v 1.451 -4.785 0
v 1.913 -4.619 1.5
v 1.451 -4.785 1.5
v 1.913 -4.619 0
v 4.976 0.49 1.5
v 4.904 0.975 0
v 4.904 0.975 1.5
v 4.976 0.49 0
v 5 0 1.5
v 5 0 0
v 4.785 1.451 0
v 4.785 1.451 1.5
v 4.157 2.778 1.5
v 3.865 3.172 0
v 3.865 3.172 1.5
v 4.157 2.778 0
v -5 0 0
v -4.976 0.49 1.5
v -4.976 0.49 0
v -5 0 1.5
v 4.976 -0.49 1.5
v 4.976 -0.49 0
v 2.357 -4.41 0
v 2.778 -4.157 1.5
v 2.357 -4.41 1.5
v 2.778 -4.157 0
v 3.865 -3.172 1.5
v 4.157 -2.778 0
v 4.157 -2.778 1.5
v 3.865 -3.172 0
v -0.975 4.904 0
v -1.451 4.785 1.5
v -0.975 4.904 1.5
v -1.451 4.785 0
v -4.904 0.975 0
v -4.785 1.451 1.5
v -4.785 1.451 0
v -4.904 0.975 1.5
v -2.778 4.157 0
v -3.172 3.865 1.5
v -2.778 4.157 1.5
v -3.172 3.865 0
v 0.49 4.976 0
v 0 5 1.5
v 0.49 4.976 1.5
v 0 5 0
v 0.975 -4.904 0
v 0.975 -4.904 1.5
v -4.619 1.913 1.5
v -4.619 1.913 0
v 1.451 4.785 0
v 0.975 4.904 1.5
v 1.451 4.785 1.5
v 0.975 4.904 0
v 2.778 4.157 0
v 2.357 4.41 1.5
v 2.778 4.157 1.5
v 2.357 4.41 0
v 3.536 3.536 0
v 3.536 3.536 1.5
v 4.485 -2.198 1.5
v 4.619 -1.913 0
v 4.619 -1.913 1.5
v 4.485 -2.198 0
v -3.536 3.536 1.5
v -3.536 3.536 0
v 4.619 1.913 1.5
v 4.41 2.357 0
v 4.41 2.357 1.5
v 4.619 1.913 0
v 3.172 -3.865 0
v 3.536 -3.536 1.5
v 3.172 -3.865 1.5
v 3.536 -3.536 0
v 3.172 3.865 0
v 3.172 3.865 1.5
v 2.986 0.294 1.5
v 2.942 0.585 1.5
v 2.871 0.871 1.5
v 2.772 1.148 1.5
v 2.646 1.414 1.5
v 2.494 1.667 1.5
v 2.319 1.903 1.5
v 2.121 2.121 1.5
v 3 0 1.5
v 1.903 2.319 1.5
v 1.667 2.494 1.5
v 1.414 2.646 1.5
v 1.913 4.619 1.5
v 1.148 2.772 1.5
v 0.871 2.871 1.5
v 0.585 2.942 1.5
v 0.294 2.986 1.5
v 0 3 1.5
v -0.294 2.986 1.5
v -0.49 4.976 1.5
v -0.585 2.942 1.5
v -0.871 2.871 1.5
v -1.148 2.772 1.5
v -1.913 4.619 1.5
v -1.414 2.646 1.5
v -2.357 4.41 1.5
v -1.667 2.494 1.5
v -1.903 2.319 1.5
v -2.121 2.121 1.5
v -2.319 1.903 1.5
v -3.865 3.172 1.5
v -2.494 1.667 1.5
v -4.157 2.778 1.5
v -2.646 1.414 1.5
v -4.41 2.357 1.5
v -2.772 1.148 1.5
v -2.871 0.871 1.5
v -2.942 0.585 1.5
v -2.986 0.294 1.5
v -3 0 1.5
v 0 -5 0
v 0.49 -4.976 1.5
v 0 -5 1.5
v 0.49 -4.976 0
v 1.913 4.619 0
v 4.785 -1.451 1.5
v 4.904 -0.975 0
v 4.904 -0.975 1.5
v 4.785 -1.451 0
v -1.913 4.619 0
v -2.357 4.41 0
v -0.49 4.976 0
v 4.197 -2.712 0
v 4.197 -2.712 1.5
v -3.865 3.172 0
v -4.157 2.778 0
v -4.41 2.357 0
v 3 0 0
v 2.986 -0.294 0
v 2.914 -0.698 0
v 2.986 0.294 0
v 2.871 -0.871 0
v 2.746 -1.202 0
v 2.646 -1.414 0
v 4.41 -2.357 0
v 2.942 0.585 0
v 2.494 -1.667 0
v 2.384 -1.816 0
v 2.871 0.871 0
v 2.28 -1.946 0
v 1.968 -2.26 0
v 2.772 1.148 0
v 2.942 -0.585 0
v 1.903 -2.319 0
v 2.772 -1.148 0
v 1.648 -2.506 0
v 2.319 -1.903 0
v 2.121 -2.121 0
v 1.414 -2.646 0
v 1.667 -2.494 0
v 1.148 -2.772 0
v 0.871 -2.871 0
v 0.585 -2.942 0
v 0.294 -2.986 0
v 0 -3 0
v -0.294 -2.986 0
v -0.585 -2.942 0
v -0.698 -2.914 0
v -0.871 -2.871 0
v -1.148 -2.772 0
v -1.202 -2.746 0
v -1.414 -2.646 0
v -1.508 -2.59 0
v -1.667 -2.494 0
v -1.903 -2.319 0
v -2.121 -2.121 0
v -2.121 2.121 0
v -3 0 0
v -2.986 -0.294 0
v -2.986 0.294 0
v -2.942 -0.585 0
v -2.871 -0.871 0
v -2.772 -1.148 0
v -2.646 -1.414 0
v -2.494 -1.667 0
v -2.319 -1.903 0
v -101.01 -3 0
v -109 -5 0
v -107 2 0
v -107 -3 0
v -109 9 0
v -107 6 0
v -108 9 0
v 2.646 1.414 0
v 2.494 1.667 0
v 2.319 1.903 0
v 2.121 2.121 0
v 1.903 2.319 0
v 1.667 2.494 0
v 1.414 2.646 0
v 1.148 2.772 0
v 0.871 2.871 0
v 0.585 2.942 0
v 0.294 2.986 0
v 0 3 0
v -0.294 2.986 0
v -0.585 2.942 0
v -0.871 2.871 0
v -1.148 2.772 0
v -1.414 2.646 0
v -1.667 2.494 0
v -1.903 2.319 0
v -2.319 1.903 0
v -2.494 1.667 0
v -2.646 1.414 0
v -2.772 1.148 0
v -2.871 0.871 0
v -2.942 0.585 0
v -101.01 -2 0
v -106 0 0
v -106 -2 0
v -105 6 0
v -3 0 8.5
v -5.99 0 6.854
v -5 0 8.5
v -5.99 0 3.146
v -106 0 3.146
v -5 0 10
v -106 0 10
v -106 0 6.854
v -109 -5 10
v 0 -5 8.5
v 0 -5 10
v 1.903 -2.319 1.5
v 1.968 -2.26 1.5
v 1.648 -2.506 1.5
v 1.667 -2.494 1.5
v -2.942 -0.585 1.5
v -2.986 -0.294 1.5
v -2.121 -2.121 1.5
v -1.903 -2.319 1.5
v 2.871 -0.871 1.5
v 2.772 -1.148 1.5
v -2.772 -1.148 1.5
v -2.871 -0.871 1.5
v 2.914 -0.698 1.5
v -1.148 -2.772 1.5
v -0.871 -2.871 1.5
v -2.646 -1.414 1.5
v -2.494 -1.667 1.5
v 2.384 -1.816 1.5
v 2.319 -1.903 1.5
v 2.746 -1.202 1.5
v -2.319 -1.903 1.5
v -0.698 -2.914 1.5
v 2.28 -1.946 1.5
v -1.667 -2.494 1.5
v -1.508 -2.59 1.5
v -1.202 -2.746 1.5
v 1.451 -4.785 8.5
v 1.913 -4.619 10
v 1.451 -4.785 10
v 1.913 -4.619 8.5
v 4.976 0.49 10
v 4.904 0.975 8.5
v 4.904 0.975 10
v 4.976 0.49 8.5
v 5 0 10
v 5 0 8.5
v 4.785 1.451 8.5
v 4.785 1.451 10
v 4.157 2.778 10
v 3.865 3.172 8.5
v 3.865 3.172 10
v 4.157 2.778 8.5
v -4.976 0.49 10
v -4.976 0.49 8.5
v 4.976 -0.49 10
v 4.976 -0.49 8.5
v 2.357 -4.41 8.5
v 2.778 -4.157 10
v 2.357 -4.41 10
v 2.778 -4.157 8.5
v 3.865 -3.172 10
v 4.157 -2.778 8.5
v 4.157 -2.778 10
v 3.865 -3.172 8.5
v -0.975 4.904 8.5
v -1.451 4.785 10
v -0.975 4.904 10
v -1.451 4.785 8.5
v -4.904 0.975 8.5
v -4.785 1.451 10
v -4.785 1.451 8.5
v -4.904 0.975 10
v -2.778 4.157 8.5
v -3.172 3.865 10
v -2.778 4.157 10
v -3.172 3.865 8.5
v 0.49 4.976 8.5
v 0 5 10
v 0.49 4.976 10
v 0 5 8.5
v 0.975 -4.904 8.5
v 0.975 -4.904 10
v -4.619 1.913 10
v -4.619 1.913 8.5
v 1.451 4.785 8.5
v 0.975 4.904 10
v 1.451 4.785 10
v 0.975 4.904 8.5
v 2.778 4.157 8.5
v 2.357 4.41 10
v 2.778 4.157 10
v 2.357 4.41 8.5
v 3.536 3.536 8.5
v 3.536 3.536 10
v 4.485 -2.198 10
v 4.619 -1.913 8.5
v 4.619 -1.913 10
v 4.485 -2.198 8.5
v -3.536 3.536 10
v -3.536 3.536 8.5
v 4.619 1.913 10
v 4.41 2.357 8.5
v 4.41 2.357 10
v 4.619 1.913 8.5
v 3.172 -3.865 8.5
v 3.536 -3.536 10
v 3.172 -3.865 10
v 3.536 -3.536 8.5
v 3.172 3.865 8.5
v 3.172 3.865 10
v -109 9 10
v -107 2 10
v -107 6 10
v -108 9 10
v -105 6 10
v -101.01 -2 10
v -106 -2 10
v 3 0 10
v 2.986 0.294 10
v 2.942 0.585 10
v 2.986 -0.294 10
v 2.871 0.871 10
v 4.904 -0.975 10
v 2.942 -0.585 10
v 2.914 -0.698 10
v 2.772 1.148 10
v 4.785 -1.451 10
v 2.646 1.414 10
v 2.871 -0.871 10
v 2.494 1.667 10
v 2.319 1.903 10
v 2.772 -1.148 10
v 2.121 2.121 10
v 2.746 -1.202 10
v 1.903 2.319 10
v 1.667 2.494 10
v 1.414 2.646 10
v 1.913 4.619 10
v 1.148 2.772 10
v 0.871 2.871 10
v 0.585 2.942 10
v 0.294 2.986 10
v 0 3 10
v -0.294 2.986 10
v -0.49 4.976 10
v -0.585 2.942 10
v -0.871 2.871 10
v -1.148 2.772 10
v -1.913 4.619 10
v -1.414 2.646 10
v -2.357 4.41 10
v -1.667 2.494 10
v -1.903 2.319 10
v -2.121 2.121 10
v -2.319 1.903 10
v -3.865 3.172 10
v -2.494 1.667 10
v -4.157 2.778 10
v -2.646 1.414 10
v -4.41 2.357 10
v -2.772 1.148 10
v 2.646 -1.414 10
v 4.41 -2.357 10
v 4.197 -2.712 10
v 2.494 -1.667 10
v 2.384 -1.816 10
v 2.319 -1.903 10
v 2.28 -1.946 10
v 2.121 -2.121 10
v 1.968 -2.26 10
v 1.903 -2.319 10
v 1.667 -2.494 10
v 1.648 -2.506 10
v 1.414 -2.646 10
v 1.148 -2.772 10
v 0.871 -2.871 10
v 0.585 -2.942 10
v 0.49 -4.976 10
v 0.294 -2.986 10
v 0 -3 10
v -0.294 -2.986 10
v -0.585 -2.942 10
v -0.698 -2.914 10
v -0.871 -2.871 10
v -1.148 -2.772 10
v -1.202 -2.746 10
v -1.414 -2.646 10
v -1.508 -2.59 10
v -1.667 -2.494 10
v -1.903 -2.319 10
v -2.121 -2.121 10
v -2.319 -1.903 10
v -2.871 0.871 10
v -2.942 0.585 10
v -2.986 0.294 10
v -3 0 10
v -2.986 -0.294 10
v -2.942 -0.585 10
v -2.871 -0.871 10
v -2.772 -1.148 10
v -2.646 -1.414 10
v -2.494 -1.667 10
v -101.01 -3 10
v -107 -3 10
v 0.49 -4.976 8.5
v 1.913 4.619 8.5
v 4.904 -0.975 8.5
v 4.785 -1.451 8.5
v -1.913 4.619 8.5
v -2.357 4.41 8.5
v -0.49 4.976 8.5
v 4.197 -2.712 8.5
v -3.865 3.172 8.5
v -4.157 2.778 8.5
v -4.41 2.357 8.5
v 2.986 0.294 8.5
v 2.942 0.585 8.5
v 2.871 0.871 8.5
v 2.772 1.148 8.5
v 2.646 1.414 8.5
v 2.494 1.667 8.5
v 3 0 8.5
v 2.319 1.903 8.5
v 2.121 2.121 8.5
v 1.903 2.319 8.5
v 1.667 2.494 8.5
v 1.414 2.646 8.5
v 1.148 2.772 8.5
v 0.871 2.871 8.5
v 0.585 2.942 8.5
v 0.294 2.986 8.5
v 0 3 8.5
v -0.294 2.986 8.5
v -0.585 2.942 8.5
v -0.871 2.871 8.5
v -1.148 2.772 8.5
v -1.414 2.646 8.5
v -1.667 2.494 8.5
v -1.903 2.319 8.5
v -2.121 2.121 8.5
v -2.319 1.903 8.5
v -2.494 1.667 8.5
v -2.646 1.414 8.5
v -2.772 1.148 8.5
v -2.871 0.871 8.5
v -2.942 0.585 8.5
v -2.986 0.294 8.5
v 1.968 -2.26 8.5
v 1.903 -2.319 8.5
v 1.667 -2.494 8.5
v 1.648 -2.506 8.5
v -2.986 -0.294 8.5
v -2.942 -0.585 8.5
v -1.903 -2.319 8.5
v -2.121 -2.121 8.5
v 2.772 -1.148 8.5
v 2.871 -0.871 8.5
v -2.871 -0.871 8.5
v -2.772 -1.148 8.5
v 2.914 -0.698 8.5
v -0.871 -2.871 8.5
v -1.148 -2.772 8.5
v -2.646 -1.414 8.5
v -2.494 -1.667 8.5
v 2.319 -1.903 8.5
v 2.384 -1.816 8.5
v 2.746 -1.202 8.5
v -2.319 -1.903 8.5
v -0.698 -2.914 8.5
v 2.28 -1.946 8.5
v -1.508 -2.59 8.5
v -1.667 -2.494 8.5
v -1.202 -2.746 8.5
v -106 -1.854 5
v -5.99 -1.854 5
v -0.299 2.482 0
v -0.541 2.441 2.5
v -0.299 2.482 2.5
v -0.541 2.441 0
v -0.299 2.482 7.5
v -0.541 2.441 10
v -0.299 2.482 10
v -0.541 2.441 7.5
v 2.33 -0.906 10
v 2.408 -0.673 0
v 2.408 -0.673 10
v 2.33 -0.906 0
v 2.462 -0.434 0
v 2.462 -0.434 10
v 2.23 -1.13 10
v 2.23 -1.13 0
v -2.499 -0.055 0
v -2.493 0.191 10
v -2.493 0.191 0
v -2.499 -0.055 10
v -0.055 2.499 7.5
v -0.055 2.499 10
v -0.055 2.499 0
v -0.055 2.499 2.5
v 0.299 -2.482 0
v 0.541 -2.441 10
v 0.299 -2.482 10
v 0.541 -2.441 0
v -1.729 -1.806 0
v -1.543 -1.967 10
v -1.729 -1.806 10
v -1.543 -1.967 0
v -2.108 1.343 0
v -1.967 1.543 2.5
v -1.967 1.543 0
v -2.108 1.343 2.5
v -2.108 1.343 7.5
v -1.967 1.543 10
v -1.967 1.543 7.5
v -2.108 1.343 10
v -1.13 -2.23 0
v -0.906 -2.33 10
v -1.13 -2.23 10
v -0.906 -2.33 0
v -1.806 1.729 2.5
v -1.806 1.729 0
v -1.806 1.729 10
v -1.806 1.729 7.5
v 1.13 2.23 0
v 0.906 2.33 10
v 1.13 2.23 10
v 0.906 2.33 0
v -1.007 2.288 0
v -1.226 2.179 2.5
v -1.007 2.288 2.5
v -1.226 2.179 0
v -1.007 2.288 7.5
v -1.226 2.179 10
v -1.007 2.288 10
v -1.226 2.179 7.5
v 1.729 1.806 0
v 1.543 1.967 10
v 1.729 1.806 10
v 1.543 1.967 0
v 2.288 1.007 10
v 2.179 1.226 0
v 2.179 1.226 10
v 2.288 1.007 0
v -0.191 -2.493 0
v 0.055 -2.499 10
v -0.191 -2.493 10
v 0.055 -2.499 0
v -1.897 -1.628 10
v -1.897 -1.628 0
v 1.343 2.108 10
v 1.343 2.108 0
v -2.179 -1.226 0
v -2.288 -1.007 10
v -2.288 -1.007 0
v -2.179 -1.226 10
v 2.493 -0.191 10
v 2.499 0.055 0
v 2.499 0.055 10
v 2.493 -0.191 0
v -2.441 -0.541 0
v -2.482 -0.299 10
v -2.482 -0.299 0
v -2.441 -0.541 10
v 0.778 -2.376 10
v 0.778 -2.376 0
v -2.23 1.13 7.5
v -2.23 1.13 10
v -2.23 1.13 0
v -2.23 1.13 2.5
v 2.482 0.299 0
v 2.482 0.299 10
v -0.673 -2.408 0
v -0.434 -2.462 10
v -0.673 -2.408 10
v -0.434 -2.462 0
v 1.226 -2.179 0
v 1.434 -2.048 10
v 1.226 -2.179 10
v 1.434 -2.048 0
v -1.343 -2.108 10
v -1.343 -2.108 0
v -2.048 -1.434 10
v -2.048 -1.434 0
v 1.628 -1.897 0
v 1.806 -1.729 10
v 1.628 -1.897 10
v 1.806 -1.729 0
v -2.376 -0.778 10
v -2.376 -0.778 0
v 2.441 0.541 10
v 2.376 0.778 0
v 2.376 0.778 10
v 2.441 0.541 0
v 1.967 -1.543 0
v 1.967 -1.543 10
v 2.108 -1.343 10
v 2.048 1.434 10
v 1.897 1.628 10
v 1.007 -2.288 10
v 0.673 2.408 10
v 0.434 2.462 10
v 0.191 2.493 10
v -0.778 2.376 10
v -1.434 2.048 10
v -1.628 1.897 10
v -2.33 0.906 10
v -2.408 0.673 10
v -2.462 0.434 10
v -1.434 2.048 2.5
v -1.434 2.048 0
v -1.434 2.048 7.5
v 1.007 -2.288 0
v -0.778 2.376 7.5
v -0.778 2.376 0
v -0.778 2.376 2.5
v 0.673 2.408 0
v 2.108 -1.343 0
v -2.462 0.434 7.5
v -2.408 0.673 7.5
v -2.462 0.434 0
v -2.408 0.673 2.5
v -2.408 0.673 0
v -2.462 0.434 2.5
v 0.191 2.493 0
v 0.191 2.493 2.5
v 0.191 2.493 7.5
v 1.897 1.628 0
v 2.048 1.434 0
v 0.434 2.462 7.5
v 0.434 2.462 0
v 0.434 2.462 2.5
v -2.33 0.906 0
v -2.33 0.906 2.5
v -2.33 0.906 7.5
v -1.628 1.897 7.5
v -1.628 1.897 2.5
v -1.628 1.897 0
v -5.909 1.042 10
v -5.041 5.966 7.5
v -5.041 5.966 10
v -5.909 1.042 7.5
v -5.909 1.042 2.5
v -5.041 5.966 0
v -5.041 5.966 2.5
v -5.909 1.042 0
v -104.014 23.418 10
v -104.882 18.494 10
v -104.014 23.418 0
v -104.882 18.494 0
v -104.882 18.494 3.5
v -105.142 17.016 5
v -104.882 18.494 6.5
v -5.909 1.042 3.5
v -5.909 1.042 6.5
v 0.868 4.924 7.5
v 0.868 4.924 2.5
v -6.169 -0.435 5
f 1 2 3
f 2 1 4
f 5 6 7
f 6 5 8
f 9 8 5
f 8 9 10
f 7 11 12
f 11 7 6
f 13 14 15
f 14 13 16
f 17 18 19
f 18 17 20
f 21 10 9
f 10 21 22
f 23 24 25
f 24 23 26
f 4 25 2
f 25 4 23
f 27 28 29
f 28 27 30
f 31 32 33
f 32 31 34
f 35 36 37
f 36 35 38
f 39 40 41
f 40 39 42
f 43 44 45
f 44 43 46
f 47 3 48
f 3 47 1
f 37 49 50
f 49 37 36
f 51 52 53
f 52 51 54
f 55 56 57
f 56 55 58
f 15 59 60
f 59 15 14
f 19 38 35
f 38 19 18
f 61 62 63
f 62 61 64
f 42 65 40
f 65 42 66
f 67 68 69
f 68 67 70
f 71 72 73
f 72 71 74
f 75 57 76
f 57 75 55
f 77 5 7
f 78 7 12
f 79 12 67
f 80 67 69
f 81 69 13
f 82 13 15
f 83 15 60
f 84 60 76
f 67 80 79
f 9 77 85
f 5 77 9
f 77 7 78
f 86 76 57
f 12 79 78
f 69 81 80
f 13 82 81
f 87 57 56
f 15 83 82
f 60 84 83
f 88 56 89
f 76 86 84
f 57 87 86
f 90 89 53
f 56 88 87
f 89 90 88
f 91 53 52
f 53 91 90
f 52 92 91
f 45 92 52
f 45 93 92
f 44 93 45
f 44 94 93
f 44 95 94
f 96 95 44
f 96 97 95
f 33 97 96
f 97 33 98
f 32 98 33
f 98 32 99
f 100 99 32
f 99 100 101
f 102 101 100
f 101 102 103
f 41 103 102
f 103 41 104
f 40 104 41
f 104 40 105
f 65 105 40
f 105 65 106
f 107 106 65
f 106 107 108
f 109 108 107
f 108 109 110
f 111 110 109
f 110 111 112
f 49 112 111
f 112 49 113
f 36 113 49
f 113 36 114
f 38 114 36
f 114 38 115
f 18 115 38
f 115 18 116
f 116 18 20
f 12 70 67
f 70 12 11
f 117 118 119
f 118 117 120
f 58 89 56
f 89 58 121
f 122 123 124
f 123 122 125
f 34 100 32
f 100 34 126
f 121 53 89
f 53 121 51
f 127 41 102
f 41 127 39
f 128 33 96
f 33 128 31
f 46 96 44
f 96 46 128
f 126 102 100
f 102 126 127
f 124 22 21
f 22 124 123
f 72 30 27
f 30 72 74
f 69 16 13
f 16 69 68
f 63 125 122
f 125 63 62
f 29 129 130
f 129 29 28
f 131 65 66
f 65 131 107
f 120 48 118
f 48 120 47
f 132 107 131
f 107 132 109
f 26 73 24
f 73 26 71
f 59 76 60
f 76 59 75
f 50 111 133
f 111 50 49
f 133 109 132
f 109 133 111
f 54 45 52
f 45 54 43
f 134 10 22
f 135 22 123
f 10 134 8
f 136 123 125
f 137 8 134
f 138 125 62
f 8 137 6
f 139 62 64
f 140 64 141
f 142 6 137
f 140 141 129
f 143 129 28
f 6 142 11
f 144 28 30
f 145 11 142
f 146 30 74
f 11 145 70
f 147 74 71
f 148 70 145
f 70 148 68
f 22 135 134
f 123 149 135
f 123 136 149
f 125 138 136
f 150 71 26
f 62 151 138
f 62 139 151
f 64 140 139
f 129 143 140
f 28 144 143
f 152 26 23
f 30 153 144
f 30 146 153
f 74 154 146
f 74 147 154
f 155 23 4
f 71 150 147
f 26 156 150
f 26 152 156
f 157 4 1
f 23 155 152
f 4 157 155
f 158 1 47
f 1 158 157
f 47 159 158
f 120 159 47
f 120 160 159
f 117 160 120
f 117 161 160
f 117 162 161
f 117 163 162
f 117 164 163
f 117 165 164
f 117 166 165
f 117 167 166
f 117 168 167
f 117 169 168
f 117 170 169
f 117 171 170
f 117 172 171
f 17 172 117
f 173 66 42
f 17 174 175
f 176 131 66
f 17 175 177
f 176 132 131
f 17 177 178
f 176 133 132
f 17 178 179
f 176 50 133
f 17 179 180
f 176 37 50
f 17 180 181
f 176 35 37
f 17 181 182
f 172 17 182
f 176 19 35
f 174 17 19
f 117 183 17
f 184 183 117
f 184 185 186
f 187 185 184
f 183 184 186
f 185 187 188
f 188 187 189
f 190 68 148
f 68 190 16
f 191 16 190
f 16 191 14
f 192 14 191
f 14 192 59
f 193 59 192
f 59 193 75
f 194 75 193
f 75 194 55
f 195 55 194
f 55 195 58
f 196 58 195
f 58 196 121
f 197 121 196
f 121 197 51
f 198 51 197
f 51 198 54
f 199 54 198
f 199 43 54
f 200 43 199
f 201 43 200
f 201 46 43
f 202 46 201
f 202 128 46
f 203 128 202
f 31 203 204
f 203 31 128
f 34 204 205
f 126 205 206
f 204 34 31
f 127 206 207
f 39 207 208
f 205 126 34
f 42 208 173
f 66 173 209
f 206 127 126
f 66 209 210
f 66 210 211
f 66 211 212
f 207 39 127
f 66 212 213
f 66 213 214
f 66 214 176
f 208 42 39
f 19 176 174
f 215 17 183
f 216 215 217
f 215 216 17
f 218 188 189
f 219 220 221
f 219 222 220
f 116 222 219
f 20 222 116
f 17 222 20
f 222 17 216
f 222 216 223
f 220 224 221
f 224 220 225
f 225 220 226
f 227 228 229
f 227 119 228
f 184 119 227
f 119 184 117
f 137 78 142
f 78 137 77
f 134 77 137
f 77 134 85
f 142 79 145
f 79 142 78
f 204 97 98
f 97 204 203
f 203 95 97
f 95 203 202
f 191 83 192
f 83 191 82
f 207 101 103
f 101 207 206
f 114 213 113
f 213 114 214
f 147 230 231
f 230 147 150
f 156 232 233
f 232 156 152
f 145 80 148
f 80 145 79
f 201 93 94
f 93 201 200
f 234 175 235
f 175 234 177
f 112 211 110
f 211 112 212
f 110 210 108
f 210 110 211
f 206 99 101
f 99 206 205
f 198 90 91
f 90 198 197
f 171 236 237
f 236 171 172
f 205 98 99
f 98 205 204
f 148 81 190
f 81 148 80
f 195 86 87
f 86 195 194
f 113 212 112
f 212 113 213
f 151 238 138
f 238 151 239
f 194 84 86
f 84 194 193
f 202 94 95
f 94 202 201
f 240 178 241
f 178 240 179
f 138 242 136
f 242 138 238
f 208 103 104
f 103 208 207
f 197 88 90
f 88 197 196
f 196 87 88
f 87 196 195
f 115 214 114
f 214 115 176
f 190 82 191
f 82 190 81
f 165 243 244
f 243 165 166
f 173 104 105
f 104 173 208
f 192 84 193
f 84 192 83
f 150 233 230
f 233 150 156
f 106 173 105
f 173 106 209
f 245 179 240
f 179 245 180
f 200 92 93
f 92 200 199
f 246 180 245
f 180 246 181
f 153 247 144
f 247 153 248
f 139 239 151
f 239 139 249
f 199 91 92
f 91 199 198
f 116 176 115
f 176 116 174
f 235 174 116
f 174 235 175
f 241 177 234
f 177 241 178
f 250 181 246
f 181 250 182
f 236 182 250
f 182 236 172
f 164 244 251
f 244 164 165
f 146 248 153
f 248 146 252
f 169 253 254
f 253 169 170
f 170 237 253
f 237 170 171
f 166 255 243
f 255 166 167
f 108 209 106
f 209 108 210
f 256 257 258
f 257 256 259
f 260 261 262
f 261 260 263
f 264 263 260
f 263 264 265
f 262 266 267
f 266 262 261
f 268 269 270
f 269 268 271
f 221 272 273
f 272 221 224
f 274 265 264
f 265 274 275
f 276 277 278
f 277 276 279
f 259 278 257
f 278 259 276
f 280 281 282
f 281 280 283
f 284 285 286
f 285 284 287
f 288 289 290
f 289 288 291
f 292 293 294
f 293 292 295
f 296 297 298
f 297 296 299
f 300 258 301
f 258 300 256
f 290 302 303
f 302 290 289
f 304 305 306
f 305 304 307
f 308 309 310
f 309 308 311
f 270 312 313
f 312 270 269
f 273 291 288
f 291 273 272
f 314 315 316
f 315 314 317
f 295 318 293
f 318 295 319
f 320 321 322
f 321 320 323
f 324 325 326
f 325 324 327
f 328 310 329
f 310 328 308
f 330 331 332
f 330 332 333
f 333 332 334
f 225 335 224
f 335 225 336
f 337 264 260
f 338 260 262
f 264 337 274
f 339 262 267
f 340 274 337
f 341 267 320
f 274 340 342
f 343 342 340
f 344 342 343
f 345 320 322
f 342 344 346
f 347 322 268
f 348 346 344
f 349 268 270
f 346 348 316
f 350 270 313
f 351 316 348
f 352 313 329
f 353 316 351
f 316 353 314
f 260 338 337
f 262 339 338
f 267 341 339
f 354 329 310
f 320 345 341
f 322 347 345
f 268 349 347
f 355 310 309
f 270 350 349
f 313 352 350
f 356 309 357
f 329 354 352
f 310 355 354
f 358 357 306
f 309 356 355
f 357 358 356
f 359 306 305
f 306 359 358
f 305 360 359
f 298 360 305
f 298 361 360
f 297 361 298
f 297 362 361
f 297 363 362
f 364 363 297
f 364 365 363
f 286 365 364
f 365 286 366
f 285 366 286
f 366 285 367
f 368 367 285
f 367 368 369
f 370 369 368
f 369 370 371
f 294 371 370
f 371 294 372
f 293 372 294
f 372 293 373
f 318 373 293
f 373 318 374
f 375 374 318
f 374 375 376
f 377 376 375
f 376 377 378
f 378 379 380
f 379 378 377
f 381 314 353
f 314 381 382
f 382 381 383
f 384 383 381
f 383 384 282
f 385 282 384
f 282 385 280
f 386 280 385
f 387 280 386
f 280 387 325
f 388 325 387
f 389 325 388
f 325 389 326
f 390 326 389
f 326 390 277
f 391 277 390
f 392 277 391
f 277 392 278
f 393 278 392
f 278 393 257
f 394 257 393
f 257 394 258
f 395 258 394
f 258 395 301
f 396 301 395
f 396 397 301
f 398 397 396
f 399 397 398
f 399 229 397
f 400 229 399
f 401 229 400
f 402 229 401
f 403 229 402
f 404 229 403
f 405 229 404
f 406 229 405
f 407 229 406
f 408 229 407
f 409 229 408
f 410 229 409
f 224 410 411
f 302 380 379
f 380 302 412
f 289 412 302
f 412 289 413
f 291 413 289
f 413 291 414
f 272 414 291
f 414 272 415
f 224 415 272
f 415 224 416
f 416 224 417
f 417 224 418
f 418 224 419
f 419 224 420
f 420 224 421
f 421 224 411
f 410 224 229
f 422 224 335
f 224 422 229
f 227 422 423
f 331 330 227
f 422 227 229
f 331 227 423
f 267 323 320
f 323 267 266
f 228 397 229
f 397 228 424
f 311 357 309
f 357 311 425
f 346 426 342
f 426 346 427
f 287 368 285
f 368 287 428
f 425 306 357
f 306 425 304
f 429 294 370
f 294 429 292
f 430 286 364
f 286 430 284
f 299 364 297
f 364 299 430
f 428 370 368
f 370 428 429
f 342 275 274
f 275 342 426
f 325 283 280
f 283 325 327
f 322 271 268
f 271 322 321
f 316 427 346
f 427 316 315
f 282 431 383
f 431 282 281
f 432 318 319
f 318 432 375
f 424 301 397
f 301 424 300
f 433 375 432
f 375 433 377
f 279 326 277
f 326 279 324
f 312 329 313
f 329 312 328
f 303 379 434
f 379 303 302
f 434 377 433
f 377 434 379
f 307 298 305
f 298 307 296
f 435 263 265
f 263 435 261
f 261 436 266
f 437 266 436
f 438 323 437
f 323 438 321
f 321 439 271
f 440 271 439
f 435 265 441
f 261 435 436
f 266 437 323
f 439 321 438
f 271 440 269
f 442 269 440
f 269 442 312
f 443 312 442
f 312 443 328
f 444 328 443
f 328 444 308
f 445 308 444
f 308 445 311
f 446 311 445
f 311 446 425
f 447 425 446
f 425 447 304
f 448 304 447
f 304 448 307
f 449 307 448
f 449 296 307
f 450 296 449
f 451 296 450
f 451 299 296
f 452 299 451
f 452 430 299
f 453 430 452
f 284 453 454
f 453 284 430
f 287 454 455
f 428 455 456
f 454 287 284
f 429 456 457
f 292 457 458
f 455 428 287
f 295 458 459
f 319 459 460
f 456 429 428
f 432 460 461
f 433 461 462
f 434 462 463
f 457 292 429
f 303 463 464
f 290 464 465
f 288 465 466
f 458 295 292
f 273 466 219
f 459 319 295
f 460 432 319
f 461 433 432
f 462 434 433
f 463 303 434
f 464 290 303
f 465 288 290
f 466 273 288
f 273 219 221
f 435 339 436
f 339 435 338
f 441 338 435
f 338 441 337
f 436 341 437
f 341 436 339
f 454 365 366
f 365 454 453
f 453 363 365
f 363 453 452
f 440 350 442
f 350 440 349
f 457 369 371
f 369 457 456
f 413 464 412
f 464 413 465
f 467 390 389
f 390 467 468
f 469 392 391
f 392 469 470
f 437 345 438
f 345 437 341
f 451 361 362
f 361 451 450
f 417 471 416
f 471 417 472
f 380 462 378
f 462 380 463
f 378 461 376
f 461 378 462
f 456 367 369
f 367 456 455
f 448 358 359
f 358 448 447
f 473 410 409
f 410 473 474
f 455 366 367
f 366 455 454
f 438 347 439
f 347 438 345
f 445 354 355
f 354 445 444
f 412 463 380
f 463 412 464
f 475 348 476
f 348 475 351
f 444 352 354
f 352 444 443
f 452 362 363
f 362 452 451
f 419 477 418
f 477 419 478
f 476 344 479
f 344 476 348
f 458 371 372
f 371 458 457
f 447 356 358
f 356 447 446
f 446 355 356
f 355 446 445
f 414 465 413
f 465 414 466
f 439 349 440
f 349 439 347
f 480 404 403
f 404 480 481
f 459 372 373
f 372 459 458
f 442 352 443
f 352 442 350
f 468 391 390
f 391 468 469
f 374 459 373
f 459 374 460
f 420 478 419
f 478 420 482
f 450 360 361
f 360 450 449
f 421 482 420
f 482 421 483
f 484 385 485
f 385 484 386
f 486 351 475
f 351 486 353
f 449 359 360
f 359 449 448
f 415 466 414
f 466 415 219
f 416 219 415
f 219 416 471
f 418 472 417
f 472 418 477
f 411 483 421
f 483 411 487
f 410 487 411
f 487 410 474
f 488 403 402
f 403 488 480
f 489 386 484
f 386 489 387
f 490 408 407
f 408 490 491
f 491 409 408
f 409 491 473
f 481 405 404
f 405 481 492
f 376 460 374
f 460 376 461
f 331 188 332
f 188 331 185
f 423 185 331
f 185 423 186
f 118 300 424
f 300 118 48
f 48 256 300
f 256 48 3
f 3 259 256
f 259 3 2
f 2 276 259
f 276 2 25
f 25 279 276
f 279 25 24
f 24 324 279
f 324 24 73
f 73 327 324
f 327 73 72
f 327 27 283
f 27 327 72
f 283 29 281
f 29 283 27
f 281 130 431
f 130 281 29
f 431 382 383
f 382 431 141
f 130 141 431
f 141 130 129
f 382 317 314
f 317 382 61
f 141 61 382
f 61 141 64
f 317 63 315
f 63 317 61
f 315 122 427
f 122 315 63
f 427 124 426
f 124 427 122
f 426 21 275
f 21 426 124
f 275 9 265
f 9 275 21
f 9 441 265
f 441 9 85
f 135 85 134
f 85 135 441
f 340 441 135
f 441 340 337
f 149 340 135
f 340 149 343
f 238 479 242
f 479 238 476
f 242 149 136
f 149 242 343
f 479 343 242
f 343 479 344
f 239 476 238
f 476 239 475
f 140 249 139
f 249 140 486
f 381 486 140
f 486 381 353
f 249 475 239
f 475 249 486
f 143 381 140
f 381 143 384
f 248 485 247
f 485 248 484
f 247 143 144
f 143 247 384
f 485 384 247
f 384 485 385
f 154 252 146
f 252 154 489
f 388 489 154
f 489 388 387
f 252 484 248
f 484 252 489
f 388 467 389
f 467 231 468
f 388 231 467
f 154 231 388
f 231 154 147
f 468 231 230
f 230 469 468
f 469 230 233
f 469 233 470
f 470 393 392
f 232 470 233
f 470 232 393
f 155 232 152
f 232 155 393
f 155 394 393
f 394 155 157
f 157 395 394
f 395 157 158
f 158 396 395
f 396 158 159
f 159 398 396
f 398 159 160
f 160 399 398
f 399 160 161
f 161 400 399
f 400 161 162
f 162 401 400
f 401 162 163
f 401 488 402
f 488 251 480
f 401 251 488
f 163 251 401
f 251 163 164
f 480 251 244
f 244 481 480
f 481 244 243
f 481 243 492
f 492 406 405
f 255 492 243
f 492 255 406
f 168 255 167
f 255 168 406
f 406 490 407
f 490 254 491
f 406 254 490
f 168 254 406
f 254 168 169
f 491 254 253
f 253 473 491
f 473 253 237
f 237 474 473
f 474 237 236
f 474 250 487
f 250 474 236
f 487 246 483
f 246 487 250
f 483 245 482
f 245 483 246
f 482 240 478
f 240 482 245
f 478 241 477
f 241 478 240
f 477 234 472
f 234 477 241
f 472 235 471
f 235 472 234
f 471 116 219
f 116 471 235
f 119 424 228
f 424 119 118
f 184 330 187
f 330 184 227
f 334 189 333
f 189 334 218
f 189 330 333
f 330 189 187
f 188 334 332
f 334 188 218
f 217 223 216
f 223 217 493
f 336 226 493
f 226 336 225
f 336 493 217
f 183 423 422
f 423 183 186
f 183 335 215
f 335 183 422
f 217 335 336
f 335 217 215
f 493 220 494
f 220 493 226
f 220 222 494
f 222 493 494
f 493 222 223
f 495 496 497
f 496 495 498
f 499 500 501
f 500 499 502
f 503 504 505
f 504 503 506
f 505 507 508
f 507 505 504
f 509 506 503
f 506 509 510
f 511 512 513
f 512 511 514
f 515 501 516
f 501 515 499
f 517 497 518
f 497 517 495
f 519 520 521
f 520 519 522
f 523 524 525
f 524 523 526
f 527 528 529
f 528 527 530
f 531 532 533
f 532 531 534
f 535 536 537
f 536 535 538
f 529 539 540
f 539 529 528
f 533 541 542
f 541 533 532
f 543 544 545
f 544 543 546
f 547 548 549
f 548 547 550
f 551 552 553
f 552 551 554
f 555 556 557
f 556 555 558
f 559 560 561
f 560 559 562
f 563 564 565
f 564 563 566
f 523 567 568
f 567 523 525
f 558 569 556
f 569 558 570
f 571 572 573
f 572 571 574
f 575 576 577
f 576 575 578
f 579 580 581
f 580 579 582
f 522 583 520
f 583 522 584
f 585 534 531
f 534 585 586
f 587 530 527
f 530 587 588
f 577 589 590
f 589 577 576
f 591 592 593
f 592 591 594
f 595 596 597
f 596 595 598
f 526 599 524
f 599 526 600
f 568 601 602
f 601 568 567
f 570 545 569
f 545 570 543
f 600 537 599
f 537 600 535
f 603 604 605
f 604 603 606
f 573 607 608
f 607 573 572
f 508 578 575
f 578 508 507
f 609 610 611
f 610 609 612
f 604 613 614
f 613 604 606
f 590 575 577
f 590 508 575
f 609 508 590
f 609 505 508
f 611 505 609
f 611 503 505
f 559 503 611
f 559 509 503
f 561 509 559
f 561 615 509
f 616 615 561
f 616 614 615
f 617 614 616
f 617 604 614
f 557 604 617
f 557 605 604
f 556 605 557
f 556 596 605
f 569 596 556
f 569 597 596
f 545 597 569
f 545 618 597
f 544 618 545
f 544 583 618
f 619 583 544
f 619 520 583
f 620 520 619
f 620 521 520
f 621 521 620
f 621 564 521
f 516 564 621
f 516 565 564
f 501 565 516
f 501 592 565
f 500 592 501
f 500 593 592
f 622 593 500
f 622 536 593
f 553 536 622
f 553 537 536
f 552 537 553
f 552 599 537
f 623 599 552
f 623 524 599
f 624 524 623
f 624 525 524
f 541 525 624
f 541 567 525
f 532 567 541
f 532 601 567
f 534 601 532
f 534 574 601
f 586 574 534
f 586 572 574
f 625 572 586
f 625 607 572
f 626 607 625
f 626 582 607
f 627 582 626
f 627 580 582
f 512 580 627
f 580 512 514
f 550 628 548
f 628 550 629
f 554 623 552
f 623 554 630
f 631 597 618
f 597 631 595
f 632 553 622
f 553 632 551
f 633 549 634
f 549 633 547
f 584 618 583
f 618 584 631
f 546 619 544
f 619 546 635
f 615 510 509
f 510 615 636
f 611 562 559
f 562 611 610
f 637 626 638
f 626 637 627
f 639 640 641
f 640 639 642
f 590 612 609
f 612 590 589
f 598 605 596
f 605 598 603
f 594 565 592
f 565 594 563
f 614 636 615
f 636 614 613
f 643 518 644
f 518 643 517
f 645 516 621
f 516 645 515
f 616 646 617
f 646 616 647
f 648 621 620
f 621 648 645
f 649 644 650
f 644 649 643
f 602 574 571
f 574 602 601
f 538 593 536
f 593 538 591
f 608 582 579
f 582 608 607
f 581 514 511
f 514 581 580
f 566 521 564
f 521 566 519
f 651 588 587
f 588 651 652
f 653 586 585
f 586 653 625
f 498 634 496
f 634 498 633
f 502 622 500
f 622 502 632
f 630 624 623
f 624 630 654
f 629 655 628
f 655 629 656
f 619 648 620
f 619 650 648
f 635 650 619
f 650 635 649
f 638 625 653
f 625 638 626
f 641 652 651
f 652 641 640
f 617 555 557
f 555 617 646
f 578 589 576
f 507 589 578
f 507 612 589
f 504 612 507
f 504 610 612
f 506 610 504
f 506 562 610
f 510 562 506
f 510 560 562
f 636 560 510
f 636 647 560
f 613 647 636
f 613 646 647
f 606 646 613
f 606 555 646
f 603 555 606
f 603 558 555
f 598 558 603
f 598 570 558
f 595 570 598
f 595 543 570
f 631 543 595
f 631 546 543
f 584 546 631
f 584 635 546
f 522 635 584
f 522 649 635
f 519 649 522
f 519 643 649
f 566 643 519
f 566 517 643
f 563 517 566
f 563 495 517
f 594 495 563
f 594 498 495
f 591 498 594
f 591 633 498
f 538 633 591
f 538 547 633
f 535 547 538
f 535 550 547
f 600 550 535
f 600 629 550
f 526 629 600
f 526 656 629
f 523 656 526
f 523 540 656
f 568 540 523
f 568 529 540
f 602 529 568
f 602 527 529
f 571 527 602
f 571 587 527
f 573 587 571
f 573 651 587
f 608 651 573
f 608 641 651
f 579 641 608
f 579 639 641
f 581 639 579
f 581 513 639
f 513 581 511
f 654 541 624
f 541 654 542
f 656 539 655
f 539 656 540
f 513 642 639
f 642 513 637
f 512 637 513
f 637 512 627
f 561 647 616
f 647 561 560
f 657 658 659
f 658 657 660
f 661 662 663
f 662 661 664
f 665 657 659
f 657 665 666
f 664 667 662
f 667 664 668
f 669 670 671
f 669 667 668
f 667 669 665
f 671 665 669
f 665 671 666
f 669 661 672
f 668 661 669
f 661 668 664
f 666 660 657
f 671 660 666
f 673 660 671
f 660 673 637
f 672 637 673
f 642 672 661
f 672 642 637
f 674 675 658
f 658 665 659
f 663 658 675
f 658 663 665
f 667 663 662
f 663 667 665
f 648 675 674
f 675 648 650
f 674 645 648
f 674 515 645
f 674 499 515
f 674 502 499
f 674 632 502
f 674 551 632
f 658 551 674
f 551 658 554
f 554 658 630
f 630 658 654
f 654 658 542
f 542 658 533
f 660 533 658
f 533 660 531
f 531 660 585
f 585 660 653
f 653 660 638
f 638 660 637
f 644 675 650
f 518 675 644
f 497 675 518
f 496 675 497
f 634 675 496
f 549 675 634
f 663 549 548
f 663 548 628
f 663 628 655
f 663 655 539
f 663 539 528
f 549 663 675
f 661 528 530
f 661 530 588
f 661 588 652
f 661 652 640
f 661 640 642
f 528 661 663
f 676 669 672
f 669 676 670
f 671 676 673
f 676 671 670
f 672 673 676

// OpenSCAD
// Parametric Bag Clip - PLA compatible
// https://www.thingiverse.com/thing:3388572
// by Bikecyclist
// https://www.thingiverse.com/Bikecyclist
//
// Remixed from Bag Clip - PLA compatible
// https://www.thingiverse.com/thing:330151
// by MasterFX
// https://www.thingiverse.com/MasterFX


// Effective clip length - clamp bags of this width.
l_clip = 100;

// Width of clip (per arm)
w_clip = 5;

// Height of clip
h_clip = 10;

// Thickness of the hook
th_hook = 2;

// Thickness of the ridge
th_ridge = 1.5;

// Tolerance between parts
tol = 1;

// Opening angle for print (must be < 90 or parts will fuse)
alpha = 10;

/* [Hidden] */

// Number of facets
$fn = 64;

// Small distance to ensure proper meshing
eps = 0.01;


translate ([-(l_clip/2 + w_clip + tol), -w_clip/2, 0])
difference ()
{
    union ()
    {
        //Clip Body
        translate ([-tol/2, 0, 0])
        ccube ([l_clip + tol, w_clip, h_clip]);

        //Axle to Body Connection
        eye ();
        
        linear_extrude (h_clip, convexity = 10)
        projection (cut = false)
        intersection ()
        {
            eye ();
            
            translate ([2 * w_clip + tol + eps, 0, 0])
            ccube ([l_clip, w_clip, h_clip]);
        }
        
        //Hook Body
        translate ([-l_clip/2 - th_hook/2 - tol, (w_clip + th_hook + tol)/2, 0])
        ccube ([th_hook, 2 * w_clip + th_hook + tol, h_clip]);

        //Hook Barb
        translate ([-l_clip/2 - th_hook/2 - tol, 3/2 * w_clip + th_hook, 0])
        linear_extrude (h_clip)
        polygon 
        ([
            [0, th_hook/2 + tol],
            [3/2*th_hook, -tol],
            [-th_hook/2, -tol],
            [-th_hook/2, th_hook/2 + tol],
        ]);
    }
    
    //Hook Gap
    translate ([-l_clip/2 - tol/2, th_hook, -eps])
    ccube ([tol, w_clip, h_clip + 2 * eps]);
    
    //Flexibility Cut
    translate ([-(l_clip + tol)/2 + w_clip/2 + tol/2 - eps, -w_clip/2 + th_hook + tol/2, -eps])
    ccube ([w_clip, tol, h_clip + 2 * eps]);
    
    //Ridge Recess
    translate ([0, w_clip/2, h_clip/2])
    rotate ([45, 0, 0])
    cube ([l_clip + 2 * eps, sqrt(2) * th_ridge + tol/2, sqrt(2) * th_ridge + tol/2], center = true);
}

rotate ([0, 0, -alpha])
translate ([-(l_clip/2 + w_clip) - tol, -w_clip/2, 0])
translate ([0, w_clip, 0])
mirror ([0, 1, 0])
{
    //Axle
    translate ([l_clip/2 + w_clip + tol, 1/2 * w_clip, 0])
    cylinder (d = w_clip, h = h_clip);

    //Clip Body
    translate ([-tol/4, 0, 0])
    ccube ([l_clip + tol/2, w_clip, h_clip]);
    
    //Axle to Body Connection
    translate ([w_clip/2 + tol, 0, h_clip/2])
    cube ([l_clip + w_clip, w_clip, h_clip/2], center = true);
    
    //Ridge
    translate ([-tol/4, w_clip/2, h_clip/2])
    rotate ([45, 0, 0])
    cube ([l_clip + tol/2, sqrt(2) * th_ridge, sqrt(2) * th_ridge], center = true);

}

module eye ()
{
    for (i = [-1, 1])
    translate ([w_clip + tol, 0, h_clip/2 - (h_clip/4 - tol)/2 + i * (h_clip/2 - (h_clip/4 - tol)/2)])
    difference ()
    {
        union ()
        {
            translate ([l_clip/2, w_clip/2, 0])
            cylinder (d = 2 * w_clip, h = h_clip/4 - tol);
            
            ccube ([l_clip, w_clip, h_clip/4 - tol]);
        }
        
        translate ([l_clip/2, w_clip/2, 0])
        translate ([0, 0, -eps])
        cylinder (d = w_clip + tol, h = h_clip + 2 * eps);
    }

}

module ccube (dim)
{
    translate ([0, 0, dim [2]/2])
    cube ([dim [0], dim [1], dim [2]], center = true);
}
